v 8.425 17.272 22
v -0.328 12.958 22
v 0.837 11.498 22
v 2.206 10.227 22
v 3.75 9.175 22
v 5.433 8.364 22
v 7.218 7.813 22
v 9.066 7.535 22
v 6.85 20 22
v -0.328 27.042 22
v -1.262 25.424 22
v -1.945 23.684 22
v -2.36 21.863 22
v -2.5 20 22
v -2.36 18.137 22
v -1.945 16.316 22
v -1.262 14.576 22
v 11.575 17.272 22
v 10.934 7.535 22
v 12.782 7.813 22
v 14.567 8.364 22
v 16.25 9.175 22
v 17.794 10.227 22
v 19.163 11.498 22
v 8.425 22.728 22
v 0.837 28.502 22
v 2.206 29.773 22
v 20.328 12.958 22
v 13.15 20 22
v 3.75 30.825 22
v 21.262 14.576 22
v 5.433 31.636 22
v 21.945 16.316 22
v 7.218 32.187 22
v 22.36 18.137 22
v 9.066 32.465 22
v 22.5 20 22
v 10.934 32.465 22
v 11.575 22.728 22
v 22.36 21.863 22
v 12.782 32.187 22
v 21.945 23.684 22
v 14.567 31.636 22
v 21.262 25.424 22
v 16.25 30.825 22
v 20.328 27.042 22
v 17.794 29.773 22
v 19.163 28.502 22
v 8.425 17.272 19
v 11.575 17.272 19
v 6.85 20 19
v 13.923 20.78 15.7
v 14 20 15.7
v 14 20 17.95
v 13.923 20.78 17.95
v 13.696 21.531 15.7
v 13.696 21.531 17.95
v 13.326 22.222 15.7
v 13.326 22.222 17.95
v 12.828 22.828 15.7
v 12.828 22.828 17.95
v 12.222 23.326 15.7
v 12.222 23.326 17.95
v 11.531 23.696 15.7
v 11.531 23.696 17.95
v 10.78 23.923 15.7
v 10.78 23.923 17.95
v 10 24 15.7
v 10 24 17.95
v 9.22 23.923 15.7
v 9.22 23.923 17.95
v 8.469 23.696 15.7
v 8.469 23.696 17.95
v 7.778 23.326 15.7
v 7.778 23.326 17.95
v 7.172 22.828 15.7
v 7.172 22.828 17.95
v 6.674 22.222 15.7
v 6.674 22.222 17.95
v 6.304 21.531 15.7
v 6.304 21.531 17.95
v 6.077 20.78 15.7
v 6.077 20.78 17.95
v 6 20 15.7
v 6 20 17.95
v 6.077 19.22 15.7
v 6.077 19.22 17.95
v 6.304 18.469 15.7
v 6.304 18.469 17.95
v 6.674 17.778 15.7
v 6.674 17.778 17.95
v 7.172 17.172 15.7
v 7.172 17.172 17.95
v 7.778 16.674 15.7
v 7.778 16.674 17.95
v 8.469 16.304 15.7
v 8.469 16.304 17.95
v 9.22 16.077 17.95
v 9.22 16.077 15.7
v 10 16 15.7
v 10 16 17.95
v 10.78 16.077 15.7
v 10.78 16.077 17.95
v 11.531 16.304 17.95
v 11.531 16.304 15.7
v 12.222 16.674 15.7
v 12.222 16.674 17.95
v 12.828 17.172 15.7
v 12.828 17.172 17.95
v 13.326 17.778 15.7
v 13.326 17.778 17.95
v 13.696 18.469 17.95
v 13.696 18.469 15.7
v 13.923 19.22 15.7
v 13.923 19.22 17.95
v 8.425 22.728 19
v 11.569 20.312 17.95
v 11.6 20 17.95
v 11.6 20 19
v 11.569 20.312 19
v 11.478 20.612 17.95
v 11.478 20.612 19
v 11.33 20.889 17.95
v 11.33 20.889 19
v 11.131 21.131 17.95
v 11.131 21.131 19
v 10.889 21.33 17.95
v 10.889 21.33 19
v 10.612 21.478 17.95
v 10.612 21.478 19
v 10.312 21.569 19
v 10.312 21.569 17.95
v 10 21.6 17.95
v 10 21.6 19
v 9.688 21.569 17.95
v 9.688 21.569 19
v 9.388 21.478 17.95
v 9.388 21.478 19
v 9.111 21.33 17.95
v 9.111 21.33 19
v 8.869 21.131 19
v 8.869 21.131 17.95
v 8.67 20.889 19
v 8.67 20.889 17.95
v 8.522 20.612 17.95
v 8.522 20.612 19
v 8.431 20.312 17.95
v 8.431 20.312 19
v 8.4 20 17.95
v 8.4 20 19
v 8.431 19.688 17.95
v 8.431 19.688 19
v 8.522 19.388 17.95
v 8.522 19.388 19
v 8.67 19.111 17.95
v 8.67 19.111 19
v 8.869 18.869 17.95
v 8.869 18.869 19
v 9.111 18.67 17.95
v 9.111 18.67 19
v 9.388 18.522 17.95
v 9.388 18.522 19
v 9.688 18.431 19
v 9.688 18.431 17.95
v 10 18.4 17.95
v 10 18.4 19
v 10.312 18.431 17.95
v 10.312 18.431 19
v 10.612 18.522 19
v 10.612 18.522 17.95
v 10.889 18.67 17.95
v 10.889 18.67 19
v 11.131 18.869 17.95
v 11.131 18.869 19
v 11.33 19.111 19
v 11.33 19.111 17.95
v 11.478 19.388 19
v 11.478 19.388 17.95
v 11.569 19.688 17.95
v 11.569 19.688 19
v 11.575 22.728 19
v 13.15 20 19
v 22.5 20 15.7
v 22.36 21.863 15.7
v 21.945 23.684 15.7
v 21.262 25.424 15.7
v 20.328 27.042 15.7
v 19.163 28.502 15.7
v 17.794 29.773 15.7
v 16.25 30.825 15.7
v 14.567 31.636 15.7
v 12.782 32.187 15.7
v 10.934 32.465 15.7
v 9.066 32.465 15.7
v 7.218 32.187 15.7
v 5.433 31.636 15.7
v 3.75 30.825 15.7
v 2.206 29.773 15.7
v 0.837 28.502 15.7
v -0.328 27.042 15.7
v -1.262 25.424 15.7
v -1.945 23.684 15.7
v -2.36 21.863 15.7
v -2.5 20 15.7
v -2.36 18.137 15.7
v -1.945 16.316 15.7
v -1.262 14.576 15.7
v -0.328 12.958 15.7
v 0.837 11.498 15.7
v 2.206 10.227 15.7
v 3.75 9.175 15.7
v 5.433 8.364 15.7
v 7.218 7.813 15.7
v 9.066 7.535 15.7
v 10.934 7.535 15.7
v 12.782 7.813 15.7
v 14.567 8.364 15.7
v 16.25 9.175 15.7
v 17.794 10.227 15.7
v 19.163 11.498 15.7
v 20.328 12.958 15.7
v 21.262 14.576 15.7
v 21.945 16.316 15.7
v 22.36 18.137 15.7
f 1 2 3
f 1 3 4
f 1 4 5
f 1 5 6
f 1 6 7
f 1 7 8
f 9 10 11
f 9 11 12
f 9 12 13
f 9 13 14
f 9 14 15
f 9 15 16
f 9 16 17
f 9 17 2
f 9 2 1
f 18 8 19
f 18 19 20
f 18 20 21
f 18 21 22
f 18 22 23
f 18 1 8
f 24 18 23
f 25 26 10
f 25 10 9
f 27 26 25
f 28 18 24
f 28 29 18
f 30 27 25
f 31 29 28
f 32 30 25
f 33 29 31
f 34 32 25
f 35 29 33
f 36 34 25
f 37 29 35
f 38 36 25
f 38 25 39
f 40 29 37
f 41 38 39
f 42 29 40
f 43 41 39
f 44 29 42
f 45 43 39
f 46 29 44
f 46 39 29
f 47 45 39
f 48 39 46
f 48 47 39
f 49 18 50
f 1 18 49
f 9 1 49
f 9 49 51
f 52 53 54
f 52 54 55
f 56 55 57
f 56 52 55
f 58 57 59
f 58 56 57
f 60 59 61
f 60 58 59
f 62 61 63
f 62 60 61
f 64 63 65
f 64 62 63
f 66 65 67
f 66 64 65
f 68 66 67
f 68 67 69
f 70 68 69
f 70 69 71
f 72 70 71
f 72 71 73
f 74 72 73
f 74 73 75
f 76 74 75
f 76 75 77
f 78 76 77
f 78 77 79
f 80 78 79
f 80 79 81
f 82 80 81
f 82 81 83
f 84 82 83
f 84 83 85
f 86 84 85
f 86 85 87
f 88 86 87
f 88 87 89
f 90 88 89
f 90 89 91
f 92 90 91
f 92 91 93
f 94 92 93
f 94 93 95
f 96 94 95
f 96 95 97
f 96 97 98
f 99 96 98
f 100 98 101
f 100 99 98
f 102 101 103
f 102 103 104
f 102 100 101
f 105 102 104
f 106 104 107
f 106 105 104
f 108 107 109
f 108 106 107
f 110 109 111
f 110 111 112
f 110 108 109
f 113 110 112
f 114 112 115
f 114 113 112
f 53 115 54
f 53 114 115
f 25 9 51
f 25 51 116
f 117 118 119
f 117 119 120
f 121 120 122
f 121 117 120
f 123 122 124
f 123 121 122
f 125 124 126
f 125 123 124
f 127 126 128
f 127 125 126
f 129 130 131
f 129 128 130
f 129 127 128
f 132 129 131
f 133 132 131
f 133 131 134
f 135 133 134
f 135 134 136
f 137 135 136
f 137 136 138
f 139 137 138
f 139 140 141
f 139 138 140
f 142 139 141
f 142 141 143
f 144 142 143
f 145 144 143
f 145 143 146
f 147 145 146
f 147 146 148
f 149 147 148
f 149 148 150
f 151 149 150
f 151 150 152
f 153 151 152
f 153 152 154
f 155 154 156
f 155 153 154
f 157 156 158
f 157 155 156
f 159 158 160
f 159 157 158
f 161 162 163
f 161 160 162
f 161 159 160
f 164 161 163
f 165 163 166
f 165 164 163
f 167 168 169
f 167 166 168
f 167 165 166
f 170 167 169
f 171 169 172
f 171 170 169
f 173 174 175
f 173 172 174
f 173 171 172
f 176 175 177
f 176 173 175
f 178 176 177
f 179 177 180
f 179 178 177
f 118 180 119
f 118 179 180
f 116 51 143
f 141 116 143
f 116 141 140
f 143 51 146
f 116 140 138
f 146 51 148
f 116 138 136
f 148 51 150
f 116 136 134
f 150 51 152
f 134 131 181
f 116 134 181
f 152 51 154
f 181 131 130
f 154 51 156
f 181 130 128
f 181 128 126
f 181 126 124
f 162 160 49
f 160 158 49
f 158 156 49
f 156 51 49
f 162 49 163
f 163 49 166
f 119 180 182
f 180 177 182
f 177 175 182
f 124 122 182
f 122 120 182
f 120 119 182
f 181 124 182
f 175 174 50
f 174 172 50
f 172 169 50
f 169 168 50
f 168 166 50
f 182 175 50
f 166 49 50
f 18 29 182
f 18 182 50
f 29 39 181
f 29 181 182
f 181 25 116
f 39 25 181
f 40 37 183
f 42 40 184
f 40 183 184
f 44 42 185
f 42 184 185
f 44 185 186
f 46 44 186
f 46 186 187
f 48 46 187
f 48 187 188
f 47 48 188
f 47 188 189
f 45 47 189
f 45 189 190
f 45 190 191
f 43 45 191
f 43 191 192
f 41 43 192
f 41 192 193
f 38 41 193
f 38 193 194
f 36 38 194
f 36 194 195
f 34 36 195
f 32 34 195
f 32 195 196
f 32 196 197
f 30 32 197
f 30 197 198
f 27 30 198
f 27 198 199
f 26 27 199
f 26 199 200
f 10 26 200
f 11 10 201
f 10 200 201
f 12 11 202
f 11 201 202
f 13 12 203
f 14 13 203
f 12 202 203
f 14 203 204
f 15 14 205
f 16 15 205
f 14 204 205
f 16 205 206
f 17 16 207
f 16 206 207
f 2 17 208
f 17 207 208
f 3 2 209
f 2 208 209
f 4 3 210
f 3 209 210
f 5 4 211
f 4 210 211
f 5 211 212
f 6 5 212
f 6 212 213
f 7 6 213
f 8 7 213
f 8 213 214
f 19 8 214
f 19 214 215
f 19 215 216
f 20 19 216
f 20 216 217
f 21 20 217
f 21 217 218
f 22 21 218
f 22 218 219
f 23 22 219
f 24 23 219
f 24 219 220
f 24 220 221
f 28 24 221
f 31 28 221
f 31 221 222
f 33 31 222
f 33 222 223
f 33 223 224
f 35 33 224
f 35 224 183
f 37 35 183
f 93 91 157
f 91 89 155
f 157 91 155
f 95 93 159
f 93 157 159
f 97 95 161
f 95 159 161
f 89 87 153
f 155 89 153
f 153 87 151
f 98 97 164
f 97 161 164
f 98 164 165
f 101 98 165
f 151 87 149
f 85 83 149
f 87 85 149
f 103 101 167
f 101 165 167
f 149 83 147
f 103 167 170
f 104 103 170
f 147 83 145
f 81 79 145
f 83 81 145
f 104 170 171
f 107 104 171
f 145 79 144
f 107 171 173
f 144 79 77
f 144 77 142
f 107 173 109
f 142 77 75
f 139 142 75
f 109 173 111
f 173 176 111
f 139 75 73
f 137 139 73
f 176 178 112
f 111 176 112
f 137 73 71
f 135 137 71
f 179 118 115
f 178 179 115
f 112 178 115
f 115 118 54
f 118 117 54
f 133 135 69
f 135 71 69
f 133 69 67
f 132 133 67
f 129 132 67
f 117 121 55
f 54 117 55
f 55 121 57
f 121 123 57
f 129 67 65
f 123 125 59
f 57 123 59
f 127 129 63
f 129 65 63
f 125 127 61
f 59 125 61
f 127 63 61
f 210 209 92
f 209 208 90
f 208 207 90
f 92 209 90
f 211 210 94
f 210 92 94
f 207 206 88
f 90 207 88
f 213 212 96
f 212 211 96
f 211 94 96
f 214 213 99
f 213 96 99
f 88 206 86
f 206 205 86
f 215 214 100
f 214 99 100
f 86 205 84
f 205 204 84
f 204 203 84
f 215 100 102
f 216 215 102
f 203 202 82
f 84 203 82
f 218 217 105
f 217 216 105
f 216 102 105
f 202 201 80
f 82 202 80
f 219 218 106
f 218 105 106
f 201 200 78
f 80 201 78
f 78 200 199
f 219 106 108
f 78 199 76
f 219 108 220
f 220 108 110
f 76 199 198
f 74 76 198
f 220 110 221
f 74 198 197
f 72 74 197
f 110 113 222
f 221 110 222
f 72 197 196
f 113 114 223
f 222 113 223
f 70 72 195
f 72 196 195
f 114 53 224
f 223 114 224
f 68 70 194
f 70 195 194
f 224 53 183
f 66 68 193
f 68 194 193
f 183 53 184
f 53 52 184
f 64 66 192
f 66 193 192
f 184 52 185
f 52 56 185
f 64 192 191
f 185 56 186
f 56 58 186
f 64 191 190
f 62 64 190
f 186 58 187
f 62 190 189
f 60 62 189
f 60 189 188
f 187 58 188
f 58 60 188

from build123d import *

# Parameters (mm, degrees)
BOX027_W          = 40
BOX027_H          = 50
BOX027_DEPTH      = 0.7
CYLINDER062_R     = 4
CYLINDER062_DEPTH = 2.75
CYLINDER019_R     = 1.6
CYLINDER019_DEPTH = 22.75
CYLINDER018_R     = 4
CYLINDER018_DEPTH = 2.75
PRISM003_DEPTH    = 3
CYLINDER017_R     = 12.5
CYLINDER017_DEPTH = 7


with BuildPart() as cube027:
    # Box027 → Box027 (new body)
    with BuildSketch(Plane(origin=(-10, 0, 15), x_dir=(1, 0, 0), z_dir=(0, 0, 1))):
        with Locations((20, 25)):
            Rectangle(BOX027_W, BOX027_H)
    extrude(amount=BOX027_DEPTH)


with BuildPart() as cylinder062:
    # Cylinder062 → Cylinder062 (new body)
    with BuildSketch(Plane(origin=(10, 20, 15.2), x_dir=(1, 0, 0), z_dir=(0, 0, 1))):
        Circle(CYLINDER062_R)
    extrude(amount=CYLINDER062_DEPTH)


with BuildPart() as cylinder018:
    # Cylinder019 → Cylinder019 (new body)
    with BuildSketch(Plane(origin=(10, 0, -31), x_dir=(1, 0, 0), z_dir=(0, 0, 1))):
        Circle(CYLINDER019_R)
    extrude(amount=CYLINDER019_DEPTH)


with BuildPart() as cylinder017:
    # Cylinder018 → Cylinder018 (new body)
    with BuildSketch(Plane(origin=(10, 0, -27), x_dir=(1, 0, 0), z_dir=(0, 0, 1))):
        Circle(CYLINDER018_R)
    extrude(amount=CYLINDER018_DEPTH)


with BuildPart() as prism003:
    # Prism003 → Prism003 (new body)
    with BuildSketch(Plane(origin=(10, 0, -20), x_dir=(1, 0, 0), z_dir=(0, 0, -1))):
        Polygon((3.15, 0), (1.575, 2.72798), (-1.575, 2.72798), (-3.15, 0), (-1.575, -2.72798), (1.575, -2.72798), align=None)
    extrude(amount=PRISM003_DEPTH)


with BuildPart() as plato_tornillo001:
    # Cylinder017 → Cylinder017 (new body)
    with BuildSketch(Plane(origin=(10, 0, -27), x_dir=(1, 0, 0), z_dir=(0, 0, 1))):
        Circle(CYLINDER017_R)
    extrude(amount=CYLINDER017_DEPTH)

    # Cut014: cut Prism003
    add(prism003.part, mode=Mode.SUBTRACT)

    # Cut015: cut Cylinder017
    add(cylinder017.part, mode=Mode.SUBTRACT)

    # Cut016: cut Cylinder018
    add(cylinder018.part, mode=Mode.SUBTRACT)


with BuildPart() as plato_tornillo001_1:
    # Cut016 placement: moved
    add(plato_tornillo001.part.moved(Location((0, 20, 42))))

    # Cut049: cut Cylinder062
    add(cylinder062.part, mode=Mode.SUBTRACT)

    # Cut050: cut Cube027
    add(cube027.part, mode=Mode.SUBTRACT)


solid = plato_tornillo001_1.part
